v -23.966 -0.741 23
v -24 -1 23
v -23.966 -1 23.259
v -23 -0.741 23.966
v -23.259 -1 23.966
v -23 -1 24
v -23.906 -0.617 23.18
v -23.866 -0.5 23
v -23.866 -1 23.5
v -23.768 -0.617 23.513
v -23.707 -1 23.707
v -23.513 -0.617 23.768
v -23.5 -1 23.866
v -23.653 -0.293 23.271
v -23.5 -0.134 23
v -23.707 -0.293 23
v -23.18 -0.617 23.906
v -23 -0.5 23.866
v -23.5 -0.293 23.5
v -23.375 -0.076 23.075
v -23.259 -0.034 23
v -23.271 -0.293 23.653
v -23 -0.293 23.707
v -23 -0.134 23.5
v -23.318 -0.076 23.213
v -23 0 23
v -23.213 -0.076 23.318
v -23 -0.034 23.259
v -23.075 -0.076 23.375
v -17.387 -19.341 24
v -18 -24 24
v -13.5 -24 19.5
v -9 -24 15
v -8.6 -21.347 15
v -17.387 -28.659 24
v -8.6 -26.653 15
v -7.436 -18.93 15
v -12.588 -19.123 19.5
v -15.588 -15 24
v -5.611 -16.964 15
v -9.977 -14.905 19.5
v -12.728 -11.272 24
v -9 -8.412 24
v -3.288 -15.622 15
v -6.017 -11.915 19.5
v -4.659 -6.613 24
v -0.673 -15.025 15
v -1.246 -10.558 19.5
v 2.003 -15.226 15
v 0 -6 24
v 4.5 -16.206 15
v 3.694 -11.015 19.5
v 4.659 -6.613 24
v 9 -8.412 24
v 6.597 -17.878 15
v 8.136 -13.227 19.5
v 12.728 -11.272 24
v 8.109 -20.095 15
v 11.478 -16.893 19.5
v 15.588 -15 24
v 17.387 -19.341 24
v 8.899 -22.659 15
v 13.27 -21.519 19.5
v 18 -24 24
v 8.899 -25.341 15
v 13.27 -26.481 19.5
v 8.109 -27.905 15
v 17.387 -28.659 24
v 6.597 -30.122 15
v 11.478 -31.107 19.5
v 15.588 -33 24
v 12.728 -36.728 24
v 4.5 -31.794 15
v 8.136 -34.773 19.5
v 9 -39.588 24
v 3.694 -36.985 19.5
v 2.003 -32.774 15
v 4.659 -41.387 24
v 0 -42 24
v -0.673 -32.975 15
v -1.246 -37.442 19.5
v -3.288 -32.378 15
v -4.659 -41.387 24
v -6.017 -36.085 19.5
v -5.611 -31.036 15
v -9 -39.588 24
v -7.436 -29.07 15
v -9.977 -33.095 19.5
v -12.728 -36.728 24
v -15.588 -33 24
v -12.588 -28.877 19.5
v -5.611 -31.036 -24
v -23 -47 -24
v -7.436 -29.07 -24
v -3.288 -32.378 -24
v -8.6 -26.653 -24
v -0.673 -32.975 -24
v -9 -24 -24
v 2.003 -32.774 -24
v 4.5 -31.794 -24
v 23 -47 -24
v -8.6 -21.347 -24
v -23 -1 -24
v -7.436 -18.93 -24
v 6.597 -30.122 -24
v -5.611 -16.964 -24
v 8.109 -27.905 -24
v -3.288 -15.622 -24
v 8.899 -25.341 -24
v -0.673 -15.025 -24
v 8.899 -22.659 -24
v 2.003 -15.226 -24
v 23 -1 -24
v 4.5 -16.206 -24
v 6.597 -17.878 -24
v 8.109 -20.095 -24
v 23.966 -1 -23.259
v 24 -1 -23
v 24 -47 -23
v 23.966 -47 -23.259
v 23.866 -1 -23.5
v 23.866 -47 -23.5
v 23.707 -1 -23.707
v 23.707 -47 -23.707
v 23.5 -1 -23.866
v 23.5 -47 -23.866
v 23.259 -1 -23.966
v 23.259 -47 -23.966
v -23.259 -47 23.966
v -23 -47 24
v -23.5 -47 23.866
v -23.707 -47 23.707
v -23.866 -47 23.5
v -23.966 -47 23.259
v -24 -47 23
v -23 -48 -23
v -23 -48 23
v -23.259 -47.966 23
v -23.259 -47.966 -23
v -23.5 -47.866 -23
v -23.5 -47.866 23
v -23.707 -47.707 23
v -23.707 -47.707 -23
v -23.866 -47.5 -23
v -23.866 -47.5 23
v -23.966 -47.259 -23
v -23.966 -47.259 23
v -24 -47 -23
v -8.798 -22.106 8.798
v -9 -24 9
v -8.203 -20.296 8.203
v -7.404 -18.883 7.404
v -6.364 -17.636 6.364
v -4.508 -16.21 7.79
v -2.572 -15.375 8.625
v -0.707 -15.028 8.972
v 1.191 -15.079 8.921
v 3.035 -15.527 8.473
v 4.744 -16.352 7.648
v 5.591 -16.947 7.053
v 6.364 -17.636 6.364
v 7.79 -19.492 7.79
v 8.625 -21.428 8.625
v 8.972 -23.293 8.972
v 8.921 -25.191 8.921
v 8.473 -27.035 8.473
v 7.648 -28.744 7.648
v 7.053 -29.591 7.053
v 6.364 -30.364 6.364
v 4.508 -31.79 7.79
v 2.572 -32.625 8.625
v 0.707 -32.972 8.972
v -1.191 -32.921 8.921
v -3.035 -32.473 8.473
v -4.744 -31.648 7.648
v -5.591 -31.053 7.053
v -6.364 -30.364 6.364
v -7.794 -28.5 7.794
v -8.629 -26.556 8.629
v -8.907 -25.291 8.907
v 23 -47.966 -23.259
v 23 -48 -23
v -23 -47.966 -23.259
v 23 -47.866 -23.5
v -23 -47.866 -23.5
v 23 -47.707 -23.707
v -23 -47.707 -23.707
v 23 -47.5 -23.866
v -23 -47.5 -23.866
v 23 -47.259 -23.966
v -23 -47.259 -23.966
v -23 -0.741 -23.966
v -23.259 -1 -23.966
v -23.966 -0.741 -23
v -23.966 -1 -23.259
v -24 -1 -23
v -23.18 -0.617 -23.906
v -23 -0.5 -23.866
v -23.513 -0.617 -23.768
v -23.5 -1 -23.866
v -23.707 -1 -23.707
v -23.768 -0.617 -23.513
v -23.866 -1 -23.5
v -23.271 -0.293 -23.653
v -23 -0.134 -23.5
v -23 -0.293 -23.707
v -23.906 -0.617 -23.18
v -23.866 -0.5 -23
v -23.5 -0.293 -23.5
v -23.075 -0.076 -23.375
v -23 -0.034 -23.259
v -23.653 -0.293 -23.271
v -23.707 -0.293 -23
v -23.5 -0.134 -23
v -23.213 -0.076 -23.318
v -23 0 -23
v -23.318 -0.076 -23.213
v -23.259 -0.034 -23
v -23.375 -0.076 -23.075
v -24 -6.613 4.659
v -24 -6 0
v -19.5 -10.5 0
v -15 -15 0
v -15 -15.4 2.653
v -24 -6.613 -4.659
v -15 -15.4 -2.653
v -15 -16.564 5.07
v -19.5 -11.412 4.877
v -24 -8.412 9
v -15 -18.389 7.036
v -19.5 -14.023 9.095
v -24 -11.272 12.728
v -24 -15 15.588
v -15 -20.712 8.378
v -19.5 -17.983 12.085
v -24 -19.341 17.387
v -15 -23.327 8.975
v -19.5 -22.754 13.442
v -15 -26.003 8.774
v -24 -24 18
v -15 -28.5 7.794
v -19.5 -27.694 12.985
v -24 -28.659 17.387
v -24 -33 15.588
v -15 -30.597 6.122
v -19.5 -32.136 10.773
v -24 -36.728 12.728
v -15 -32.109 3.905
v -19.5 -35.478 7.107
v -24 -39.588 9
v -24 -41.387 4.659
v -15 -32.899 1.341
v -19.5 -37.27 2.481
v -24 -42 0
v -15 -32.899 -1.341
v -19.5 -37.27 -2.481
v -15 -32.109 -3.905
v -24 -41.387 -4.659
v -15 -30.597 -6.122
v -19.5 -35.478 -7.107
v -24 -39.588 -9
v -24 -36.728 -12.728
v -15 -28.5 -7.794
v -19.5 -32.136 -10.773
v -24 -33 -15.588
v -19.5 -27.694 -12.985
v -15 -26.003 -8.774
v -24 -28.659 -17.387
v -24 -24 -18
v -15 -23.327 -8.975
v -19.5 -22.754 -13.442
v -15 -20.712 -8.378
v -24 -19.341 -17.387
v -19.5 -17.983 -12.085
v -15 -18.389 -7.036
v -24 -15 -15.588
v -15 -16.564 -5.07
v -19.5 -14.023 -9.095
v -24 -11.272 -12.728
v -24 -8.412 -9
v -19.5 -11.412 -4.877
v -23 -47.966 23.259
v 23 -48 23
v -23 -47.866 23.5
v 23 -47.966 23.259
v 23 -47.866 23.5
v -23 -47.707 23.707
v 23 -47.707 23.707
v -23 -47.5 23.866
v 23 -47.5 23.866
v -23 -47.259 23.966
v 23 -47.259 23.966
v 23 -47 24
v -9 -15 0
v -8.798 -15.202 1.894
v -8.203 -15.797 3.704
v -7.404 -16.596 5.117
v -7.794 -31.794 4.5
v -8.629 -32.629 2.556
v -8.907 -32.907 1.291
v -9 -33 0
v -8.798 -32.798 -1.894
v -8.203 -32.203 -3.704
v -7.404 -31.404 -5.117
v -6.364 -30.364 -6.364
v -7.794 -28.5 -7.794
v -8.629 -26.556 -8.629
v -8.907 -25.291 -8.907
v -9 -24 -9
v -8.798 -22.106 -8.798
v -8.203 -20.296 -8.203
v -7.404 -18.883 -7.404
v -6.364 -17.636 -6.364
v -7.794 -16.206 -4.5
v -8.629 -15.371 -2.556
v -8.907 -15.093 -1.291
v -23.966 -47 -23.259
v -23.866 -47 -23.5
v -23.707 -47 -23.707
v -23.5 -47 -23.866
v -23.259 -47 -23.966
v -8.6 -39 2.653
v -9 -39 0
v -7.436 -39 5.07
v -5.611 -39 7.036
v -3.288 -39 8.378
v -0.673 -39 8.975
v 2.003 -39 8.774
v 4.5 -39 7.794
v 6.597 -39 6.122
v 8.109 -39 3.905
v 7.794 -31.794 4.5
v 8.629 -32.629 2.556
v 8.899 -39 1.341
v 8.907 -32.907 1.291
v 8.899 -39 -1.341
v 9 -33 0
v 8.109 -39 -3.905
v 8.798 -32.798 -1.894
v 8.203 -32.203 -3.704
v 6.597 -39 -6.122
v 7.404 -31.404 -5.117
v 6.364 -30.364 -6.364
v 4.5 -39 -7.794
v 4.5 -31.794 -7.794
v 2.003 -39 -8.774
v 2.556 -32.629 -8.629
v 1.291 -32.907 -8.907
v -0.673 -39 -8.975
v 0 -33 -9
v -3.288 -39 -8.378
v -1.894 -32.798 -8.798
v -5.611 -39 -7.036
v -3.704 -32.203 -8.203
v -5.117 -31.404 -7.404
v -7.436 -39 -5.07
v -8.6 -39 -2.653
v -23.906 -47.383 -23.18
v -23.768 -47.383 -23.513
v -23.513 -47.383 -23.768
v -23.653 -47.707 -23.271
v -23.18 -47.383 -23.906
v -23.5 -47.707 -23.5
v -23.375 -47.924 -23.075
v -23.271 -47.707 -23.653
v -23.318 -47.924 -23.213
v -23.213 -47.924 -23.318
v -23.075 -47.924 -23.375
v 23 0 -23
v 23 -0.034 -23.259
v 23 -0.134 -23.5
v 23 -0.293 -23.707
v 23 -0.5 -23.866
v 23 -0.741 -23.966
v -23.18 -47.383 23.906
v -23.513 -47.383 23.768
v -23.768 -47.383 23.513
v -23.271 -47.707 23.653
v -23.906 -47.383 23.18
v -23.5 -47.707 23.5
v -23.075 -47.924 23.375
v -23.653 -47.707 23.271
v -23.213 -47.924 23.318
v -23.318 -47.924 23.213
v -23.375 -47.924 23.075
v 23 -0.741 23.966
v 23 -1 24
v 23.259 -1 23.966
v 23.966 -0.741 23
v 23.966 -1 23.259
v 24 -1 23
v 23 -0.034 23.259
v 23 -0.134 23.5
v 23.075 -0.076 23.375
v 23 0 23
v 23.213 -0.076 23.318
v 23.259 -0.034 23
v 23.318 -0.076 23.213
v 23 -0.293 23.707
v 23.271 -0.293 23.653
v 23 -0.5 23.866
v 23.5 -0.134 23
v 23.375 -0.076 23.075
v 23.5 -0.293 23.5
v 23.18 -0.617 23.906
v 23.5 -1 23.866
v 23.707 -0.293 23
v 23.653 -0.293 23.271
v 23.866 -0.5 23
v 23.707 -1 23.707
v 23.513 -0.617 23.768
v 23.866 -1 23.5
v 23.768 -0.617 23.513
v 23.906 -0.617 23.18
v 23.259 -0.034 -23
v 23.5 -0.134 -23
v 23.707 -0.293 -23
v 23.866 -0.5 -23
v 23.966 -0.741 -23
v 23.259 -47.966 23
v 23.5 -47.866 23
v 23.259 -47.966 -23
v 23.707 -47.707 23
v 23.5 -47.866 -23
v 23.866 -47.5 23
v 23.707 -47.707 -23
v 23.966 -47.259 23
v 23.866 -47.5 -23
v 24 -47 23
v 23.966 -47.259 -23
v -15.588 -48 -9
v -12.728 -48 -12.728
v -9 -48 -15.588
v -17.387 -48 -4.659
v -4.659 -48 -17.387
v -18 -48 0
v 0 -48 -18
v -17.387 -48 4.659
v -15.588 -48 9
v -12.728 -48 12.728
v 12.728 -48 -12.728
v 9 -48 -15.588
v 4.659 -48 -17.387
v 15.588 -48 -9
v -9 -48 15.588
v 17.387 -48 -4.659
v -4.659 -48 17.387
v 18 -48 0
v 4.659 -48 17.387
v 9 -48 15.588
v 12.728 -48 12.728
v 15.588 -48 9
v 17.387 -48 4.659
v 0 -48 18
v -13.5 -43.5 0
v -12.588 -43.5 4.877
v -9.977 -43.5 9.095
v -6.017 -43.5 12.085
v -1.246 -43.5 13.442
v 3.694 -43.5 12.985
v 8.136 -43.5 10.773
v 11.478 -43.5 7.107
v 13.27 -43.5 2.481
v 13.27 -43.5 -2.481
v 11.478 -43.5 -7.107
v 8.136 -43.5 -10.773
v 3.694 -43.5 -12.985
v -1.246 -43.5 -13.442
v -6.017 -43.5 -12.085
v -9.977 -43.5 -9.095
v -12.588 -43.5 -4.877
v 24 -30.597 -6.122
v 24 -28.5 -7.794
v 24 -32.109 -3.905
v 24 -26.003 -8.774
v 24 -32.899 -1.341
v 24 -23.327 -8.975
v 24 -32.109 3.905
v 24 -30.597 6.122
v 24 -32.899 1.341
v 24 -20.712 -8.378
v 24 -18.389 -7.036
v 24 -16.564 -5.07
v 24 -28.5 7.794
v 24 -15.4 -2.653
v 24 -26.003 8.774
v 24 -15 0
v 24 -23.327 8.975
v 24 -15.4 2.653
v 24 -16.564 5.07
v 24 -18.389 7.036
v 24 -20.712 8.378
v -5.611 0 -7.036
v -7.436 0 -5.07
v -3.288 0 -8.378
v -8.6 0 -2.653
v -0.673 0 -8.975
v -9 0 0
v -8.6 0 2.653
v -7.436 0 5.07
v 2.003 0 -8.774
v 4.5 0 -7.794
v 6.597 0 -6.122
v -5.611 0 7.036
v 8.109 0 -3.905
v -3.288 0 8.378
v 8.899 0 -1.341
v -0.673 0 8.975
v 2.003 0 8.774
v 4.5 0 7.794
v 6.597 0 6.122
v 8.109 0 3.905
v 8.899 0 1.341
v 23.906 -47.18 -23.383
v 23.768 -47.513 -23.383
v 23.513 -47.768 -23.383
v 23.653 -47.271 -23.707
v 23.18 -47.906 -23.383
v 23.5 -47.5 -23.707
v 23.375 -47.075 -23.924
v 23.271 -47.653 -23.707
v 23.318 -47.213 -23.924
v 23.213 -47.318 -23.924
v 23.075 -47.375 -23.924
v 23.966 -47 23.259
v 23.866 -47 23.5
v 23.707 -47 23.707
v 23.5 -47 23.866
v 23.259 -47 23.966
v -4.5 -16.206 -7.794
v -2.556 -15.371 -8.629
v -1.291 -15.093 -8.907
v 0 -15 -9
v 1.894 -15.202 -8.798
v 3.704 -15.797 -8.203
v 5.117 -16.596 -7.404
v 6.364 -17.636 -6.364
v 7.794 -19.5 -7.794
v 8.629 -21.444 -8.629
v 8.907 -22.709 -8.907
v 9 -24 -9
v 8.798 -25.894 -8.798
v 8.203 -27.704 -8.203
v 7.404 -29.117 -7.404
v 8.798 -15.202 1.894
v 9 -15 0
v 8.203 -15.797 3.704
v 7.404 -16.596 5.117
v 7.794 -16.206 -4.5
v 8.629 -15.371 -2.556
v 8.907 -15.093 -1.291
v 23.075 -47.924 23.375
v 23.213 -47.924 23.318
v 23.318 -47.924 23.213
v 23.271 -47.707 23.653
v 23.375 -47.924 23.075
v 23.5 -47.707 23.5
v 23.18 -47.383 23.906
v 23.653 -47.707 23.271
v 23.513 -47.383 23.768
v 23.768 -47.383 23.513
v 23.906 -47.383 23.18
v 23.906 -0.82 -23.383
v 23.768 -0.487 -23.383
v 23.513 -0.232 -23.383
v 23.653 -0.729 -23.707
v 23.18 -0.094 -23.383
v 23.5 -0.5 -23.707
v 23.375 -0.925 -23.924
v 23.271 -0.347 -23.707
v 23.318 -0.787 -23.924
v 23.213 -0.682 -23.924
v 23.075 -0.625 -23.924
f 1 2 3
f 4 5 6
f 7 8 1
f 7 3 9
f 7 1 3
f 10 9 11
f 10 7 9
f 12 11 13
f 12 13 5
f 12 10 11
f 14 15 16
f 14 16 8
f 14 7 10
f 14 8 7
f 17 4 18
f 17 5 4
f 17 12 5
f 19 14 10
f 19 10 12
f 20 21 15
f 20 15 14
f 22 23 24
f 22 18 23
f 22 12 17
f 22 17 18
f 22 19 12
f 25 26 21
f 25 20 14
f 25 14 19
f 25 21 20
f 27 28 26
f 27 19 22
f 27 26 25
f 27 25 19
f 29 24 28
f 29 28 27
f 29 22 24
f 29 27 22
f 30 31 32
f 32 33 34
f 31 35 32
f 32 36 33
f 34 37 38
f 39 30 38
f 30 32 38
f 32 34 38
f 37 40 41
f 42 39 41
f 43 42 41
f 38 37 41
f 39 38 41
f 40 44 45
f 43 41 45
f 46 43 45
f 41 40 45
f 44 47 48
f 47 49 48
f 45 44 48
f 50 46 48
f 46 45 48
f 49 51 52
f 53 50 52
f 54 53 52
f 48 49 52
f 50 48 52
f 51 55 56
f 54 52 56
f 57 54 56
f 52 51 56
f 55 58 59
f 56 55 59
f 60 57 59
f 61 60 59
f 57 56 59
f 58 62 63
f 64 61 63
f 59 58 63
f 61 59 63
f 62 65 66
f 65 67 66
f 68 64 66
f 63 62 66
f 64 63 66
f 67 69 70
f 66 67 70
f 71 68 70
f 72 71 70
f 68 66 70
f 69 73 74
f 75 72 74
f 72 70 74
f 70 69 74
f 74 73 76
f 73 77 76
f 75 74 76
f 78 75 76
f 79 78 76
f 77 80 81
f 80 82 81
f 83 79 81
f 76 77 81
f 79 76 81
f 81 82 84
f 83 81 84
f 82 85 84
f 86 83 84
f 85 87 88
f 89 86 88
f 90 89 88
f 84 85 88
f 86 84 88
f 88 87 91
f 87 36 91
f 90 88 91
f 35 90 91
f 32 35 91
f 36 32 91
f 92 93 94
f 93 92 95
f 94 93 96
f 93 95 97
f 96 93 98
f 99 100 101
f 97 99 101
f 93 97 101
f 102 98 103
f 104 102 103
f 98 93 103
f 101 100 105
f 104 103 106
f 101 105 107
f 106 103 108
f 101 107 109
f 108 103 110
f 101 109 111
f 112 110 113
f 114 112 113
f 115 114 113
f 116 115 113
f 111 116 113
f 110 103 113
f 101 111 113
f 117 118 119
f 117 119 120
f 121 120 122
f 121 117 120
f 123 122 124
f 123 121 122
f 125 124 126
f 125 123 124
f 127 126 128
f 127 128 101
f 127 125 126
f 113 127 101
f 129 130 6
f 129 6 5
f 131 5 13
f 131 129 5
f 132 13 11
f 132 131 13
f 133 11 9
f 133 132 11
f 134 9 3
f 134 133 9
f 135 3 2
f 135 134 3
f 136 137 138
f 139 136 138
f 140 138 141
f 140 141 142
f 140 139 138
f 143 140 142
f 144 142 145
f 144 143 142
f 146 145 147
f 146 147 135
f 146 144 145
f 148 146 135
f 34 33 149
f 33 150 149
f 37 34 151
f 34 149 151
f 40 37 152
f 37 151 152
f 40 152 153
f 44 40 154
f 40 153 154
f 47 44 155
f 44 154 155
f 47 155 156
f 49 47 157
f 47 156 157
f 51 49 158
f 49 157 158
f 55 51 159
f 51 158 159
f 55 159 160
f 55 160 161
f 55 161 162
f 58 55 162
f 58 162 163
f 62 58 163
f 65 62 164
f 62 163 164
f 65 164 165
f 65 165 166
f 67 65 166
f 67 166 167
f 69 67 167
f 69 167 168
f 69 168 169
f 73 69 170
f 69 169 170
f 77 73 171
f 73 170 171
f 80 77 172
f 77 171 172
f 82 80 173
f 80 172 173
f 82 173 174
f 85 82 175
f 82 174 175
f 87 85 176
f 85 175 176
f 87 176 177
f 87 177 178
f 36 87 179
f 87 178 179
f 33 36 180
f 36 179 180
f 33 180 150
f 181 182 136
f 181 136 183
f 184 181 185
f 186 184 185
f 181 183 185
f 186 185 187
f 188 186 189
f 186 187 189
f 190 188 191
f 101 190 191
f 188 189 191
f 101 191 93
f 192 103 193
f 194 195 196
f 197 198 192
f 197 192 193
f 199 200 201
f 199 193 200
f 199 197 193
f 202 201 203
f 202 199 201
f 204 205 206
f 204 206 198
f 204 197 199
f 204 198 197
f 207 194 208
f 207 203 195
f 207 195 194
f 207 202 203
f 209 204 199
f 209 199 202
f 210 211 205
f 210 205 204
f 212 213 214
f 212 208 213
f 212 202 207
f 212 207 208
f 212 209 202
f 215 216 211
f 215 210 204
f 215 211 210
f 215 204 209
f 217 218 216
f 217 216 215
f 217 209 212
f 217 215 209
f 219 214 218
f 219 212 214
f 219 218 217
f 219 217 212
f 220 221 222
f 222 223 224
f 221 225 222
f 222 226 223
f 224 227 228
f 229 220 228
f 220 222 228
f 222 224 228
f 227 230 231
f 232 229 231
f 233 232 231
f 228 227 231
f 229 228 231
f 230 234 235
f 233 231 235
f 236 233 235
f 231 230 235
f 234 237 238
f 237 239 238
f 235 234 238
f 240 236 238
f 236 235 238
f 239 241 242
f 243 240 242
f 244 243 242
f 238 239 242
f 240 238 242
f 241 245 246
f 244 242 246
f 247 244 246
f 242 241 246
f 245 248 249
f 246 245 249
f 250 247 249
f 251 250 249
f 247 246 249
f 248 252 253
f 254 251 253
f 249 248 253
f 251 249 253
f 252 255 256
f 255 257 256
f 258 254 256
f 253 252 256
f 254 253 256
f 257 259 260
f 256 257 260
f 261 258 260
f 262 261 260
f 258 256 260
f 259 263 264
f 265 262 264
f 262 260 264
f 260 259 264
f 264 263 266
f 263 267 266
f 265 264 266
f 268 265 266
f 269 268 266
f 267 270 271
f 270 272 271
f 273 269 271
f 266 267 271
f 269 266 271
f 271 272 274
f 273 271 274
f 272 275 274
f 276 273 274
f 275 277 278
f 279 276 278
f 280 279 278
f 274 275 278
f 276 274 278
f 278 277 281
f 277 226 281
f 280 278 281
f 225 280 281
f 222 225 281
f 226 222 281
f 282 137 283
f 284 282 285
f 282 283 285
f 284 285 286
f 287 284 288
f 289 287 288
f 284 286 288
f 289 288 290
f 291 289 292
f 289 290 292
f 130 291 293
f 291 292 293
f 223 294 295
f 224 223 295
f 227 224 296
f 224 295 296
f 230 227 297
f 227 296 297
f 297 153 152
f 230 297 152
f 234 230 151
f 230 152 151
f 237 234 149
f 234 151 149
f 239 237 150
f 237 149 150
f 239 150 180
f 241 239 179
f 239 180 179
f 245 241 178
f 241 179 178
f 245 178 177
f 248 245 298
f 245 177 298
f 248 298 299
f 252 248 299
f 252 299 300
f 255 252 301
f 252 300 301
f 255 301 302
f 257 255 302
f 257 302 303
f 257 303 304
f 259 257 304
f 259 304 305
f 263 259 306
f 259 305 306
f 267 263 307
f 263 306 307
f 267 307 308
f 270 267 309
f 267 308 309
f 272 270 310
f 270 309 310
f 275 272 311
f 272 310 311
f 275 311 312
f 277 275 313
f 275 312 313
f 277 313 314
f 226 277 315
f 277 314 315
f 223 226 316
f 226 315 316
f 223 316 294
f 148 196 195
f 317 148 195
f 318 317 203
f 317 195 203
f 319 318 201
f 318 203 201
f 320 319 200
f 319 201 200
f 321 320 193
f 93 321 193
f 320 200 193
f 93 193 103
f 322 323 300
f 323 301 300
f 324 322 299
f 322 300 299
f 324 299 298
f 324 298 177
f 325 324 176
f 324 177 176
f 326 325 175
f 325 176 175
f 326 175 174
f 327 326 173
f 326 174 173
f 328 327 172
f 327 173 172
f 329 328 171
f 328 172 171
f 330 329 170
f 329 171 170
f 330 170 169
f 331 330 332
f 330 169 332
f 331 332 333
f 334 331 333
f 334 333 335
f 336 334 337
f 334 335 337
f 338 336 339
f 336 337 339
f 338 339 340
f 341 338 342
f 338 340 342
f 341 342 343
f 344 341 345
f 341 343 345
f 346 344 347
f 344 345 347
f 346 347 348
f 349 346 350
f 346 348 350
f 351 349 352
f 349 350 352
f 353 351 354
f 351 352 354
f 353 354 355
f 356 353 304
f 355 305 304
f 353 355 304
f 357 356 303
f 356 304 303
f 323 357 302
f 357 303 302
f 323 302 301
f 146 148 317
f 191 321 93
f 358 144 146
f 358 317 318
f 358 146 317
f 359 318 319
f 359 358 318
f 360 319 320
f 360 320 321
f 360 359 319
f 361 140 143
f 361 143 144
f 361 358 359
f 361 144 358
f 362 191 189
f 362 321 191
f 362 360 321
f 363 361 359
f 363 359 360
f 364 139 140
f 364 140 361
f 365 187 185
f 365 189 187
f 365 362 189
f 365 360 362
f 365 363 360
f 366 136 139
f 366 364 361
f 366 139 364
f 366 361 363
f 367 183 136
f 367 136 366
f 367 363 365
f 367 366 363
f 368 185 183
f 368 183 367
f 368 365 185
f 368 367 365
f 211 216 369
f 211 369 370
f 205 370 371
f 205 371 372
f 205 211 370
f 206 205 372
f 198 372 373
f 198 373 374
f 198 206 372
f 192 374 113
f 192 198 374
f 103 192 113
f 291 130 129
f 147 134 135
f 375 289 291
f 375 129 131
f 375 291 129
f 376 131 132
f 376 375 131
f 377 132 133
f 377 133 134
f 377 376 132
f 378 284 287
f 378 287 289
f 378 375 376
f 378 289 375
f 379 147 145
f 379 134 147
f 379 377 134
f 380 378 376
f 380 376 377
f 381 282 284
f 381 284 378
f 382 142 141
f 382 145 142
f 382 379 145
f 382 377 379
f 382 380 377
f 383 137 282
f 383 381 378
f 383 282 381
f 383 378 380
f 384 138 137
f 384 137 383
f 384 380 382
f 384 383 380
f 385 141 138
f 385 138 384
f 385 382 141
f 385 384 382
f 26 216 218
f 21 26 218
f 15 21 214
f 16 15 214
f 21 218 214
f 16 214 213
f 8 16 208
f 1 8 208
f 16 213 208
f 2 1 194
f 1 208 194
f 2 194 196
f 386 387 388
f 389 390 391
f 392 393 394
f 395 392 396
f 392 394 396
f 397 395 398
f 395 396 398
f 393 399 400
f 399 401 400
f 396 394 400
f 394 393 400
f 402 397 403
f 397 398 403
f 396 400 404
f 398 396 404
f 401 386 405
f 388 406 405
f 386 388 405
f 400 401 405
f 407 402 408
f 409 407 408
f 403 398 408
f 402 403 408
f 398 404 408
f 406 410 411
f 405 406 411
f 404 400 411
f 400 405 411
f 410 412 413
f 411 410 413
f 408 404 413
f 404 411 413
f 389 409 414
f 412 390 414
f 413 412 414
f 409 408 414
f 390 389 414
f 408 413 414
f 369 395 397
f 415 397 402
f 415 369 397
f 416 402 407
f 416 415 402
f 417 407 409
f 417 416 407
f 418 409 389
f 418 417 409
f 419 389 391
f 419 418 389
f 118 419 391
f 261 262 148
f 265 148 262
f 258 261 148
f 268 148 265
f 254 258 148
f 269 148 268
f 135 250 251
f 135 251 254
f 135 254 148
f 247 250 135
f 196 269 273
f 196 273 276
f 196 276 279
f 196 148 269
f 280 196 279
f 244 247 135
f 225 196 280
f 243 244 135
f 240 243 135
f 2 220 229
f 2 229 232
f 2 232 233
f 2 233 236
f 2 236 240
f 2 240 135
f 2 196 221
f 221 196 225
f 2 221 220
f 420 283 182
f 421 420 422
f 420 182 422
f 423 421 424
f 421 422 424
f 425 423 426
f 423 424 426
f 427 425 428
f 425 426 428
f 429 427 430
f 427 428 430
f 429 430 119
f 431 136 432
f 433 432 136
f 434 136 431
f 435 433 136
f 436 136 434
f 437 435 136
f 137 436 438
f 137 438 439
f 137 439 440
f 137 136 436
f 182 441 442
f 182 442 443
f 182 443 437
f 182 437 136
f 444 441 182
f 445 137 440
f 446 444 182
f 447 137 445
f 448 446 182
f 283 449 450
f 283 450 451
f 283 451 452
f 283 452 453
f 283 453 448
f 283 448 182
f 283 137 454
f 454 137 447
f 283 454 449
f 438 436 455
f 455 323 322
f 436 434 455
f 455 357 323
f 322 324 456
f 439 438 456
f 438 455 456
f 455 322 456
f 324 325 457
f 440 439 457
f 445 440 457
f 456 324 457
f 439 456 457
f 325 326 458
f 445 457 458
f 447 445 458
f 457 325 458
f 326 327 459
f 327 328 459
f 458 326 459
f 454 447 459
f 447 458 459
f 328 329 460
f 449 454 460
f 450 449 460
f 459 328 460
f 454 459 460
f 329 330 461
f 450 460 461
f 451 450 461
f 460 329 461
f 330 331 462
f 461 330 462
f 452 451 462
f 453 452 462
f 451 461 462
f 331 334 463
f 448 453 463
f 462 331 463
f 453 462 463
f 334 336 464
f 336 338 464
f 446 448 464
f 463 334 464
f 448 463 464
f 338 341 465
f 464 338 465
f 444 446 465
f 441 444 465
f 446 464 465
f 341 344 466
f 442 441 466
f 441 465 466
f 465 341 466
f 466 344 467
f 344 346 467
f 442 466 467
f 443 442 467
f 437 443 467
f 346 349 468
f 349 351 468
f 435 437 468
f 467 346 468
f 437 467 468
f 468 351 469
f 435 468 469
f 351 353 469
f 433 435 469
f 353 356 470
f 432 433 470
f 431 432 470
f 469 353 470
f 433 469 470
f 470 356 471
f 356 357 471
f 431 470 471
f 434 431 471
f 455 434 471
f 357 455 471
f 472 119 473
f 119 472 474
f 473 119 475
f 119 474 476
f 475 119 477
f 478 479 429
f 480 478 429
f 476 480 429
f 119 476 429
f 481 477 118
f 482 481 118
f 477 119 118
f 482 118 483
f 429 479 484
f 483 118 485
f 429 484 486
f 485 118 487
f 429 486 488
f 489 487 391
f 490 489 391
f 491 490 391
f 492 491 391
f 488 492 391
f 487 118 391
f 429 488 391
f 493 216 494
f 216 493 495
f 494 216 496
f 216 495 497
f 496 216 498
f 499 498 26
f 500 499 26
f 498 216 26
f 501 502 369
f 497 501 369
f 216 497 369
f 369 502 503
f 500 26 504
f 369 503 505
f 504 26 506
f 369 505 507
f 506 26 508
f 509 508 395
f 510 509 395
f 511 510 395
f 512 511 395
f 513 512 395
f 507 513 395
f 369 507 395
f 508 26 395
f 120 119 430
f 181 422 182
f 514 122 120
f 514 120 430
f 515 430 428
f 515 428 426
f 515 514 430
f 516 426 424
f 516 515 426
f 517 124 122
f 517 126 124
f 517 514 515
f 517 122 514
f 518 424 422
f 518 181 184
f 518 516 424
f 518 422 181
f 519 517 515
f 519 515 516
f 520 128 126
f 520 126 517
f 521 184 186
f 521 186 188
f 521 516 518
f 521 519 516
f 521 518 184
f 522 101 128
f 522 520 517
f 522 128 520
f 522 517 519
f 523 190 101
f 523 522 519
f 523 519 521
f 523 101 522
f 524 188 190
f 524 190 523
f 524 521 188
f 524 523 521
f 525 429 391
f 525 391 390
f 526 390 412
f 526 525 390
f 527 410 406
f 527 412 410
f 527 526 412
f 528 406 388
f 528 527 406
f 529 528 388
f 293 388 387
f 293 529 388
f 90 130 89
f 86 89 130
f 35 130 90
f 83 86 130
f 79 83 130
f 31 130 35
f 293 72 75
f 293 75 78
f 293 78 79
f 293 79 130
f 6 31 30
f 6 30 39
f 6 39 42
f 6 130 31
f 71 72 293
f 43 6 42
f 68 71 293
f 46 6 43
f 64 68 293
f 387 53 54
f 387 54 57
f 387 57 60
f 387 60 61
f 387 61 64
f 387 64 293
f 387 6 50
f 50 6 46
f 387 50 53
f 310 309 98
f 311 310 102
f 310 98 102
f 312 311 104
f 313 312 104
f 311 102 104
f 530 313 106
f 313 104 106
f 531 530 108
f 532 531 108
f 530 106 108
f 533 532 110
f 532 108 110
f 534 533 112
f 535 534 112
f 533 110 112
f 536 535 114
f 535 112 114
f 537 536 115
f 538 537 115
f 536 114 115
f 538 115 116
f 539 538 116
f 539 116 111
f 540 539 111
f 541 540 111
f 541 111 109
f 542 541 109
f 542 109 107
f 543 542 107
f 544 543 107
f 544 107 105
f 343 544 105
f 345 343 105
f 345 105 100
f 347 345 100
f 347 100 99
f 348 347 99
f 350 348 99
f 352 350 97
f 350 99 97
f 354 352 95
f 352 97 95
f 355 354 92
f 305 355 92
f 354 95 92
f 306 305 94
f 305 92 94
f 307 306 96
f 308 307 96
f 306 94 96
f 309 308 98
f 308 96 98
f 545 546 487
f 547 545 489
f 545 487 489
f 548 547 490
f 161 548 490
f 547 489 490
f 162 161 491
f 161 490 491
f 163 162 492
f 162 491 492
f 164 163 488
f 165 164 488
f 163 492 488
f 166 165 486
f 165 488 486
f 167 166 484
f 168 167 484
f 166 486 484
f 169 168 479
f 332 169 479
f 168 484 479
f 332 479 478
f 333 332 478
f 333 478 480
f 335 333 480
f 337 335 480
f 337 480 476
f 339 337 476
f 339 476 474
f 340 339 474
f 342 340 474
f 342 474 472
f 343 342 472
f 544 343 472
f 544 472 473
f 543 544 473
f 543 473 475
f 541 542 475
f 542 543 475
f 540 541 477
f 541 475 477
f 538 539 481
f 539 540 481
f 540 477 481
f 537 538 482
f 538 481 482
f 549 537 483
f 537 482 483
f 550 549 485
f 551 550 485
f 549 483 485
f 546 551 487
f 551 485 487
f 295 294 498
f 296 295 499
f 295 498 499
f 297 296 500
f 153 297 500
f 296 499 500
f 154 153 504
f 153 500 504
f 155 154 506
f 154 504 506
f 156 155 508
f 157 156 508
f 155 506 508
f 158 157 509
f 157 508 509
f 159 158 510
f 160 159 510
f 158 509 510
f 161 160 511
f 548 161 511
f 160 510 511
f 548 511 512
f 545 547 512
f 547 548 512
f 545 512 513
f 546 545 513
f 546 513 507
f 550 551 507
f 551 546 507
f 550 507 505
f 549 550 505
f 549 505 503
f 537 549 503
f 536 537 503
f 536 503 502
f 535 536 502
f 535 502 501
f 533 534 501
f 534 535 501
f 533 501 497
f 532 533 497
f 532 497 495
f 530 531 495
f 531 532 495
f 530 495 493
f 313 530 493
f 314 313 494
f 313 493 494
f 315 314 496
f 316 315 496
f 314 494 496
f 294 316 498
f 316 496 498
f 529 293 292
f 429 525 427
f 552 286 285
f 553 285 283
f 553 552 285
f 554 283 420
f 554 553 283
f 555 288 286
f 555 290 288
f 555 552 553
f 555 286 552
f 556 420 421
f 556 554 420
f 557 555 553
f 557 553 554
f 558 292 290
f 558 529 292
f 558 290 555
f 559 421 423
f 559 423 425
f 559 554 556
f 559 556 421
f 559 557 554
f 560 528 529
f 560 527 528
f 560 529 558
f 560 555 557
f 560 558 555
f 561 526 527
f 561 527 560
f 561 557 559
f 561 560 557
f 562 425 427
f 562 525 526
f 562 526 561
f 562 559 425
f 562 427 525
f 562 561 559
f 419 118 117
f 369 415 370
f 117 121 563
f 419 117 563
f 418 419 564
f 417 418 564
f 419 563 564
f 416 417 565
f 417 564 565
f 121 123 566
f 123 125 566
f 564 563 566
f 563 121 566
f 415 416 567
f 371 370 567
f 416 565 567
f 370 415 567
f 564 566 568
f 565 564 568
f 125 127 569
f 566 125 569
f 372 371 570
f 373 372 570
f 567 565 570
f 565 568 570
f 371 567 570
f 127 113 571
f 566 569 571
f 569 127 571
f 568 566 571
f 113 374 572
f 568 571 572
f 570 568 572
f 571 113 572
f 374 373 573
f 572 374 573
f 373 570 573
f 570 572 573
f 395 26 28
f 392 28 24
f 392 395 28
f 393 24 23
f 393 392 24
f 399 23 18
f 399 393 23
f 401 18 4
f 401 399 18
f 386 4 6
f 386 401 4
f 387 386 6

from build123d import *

# Parameters (mm, degrees)
F0_W            = 48
F0_H            = 48
F1_DEPTH        = 48
F2_R            = 1
F3_R            = 1
F4_T1_DEPTH     = 46
F4_T3_DEPTH     = 46
F4_T5_DEPTH     = 46
F4_S9_W         = 1
F4_S9_H         = 1
F4_T10_DEPTH    = 1
F4_S15_W        = 1
F4_S15_H        = 1
F4_T16_DEPTH    = 1
F4_S21_W        = 1
F4_S21_H        = 1
F4_T22_DEPTH    = 1
F4_S27_W        = 1
F4_S27_H        = 1
F4_T28_DEPTH    = 1
F4_T32_ANGLE    = 90
F4_T34_ANGLE    = 90
F6_D            = 18
F6_CSINK_D      = 36
F6_CSINK_ANGLE  = 90
F8_D            = 18
F8_CSINK_D      = 36
F8_CSINK_ANGLE  = 90
F10_D           = 18
F10_CSINK_D     = 36
F10_CSINK_ANGLE = 90


# Not quite as in the source:
# - a fillet or chamfer that OpenCascade refuses, or shapes differently, is made with other operations: its cross-section is extruded or revolved along the edge and cut away or added


with BuildPart() as f1:
    # F0 (on Front) → F1 (new body)
    with BuildSketch(Plane.XZ):
        Rectangle(F0_W, F0_H)
    extrude(amount=F1_DEPTH)

    # F2
    f2_edges = [f1.edges().sort_by_distance(p)[0] for p in [
        (24, -24, 24),
    ]]
    fillet(f2_edges, radius=F2_R)

    # F3
    f3_edges = [f1.edges().sort_by_distance(p)[0] for p in [
        (-24, -24, 24),
        (-0.5, 0, 24),
        (-0.5, -48, 24),
    ]]
    fillet(f3_edges, radius=F3_R)

    # F4: fillet of radius 1 on 8 edges, made by hand

    # F4_s2 → F4_t1 (cut)
    with BuildSketch(Plane.XY.offset(-23)):
        with BuildLine():
            ThreePointArc((-23, -48), (-23.7071067812, -47.7071067812), (-24, -47))
            Line((-24, -47), (-24, -48))
            Line((-24, -48), (-23, -48))
        make_face()
        with BuildLine():
            ThreePointArc((-23, 0), (-23.7071067812, -0.2928932188), (-24, -1))
            Line((-24, -1), (-24, 0))
            Line((-24, 0), (-23, 0))
        make_face()
    extrude(amount=F4_T1_DEPTH, mode=Mode.SUBTRACT)

    # F4_s4 → F4_t3 (cut)
    with BuildSketch(Plane.YZ.offset(-23)):
        with BuildLine():
            ThreePointArc((0, -23), (-0.2928932188, -23.7071067812), (-1, -24))
            Line((-1, -24), (0, -24))
            Line((0, -24), (0, -23))
        make_face()
        with BuildLine():
            ThreePointArc((-48, -23), (-47.7071067812, -23.7071067812), (-47, -24))
            Line((-47, -24), (-48, -24))
            Line((-48, -24), (-48, -23))
        make_face()
    extrude(amount=F4_T3_DEPTH, mode=Mode.SUBTRACT)

    # F4_s6 → F4_t5 (cut)
    with BuildSketch(Plane.XZ.offset(1)):
        with BuildLine():
            ThreePointArc((-24, -23), (-23.7071067812, -23.7071067812), (-23, -24))
            Line((-23, -24), (-24, -24))
            Line((-24, -24), (-24, -23))
        make_face()
        with BuildLine():
            ThreePointArc((24, -23), (23.7071067812, -23.7071067812), (23, -24))
            Line((23, -24), (24, -24))
            Line((24, -24), (24, -23))
        make_face()
    extrude(amount=F4_T5_DEPTH, mode=Mode.SUBTRACT)


with BuildPart() as f4_tool8:
    # F4_s9 → F4_t10 (new body)
    with BuildSketch(Plane.XZ.offset(1)):
        with Locations((-23.5, 23.5)):
            Rectangle(F4_S9_W, F4_S9_H)
    extrude(amount=-F4_T10_DEPTH)

    # F4_s11 → F4_t12 (revolve, cut)
    with BuildSketch(Plane(origin=(-23, -1, 23), x_dir=(0.7071067812, 0, -0.7071067812), z_dir=(0.7071067812, 0, 0.7071067812))):
        with BuildLine():
            ThreePointArc((0, -1), (1, 0), (0, 1))
            Line((0, 1), (0, -1))
        make_face()
    revolve(axis=Axis((-23, -1, 23), (0, 1, 0)), mode=Mode.SUBTRACT)


with BuildPart() as f1_1:
    add(f1.part)

    # F4_t7: cut F4_tool8
    add(f4_tool8.part, mode=Mode.SUBTRACT)


with BuildPart() as f4_tool14:
    # F4_s15 → F4_t16 (new body)
    with BuildSketch(Plane.XZ.offset(47)):
        with Locations((-23.5, 23.5)):
            Rectangle(F4_S15_W, F4_S15_H)
    extrude(amount=F4_T16_DEPTH)

    # F4_s17 → F4_t18 (revolve, cut)
    with BuildSketch(Plane(origin=(-23, -47, 23), x_dir=(0.7071067812, 0, -0.7071067812), z_dir=(-0.7071067812, 0, -0.7071067812))):
        with BuildLine():
            ThreePointArc((0, -1), (1, 0), (0, 1))
            Line((0, 1), (0, -1))
        make_face()
    revolve(axis=Axis((-23, -47, 23), (0, -1, 0)), mode=Mode.SUBTRACT)


with BuildPart() as f1_2:
    add(f1_1.part)

    # F4_t13: cut F4_tool14
    add(f4_tool14.part, mode=Mode.SUBTRACT)


with BuildPart() as f4_tool20:
    # F4_s21 → F4_t22 (new body)
    with BuildSketch(Plane.XZ.offset(47)):
        with Locations((-23.5, -23.5)):
            Rectangle(F4_S21_W, F4_S21_H)
    extrude(amount=F4_T22_DEPTH)

    # F4_s23 → F4_t24 (revolve, cut)
    with BuildSketch(Plane(origin=(-23, -47, -23), x_dir=(0.7071067812, 0, 0.7071067812), z_dir=(0.7071067812, 0, -0.7071067812))):
        with BuildLine():
            ThreePointArc((0, -1), (1, 0), (0, 1))
            Line((0, 1), (0, -1))
        make_face()
    revolve(axis=Axis((-23, -47, -23), (0, -1, 0)), mode=Mode.SUBTRACT)


with BuildPart() as f1_3:
    add(f1_2.part)

    # F4_t19: cut F4_tool20
    add(f4_tool20.part, mode=Mode.SUBTRACT)


with BuildPart() as f4_tool26:
    # F4_s27 → F4_t28 (new body)
    with BuildSketch(Plane.XZ.offset(1)):
        with Locations((-23.5, -23.5)):
            Rectangle(F4_S27_W, F4_S27_H)
    extrude(amount=-F4_T28_DEPTH)

    # F4_s29 → F4_t30 (revolve, cut)
    with BuildSketch(Plane(origin=(-23, -1, -23), x_dir=(0.7071067812, 0, 0.7071067812), z_dir=(-0.7071067812, 0, 0.7071067812))):
        with BuildLine():
            ThreePointArc((0, -1), (1, 0), (0, 1))
            Line((0, 1), (0, -1))
        make_face()
    revolve(axis=Axis((-23, -1, -23), (0, 1, 0)), mode=Mode.SUBTRACT)


with BuildPart() as f1_4:
    add(f1_3.part)

    # F4_t25: cut F4_tool26
    add(f4_tool26.part, mode=Mode.SUBTRACT)

    # F4_s31 → F4_t32 (revolve, cut)
    with BuildSketch(Plane.XZ.offset(1)):
        with BuildLine():
            ThreePointArc((24, -23), (23.7071067812, -23.7071067812), (23, -24))
            Line((23, -24), (24, -24))
            Line((24, -24), (24, -23))
        make_face()
    revolve(axis=Axis((23, -1, -24), (0, 0, 1)), revolution_arc=F4_T32_ANGLE, mode=Mode.SUBTRACT)

    # F4_s33 → F4_t34 (revolve, cut)
    with BuildSketch(Plane.XZ.offset(47)):
        with BuildLine():
            ThreePointArc((24, -23), (23.7071067812, -23.7071067812), (23, -24))
            Line((23, -24), (24, -24))
            Line((24, -24), (24, -23))
        make_face()
    revolve(axis=Axis((23, -47, -24), (0, 0, -1)), revolution_arc=F4_T34_ANGLE, mode=Mode.SUBTRACT)

    # F6 (through all)
    with Locations(Plane.XY.offset(24)):
        with Locations((0, -24)):
            CounterSinkHole(F6_D / 2, F6_CSINK_D / 2, counter_sink_angle=F6_CSINK_ANGLE)

    # F8 (through all)
    with Locations(Plane(origin=(-24, 0, 0), x_dir=(0, -1, 0), z_dir=(-1, 0, 0))):
        with Locations((24, 0)):
            CounterSinkHole(F8_D / 2, F8_CSINK_D / 2, counter_sink_angle=F8_CSINK_ANGLE)

    # F10 (through all)
    with Locations(Plane.XZ.offset(48)):
        with Locations((0, 0)):
            CounterSinkHole(F10_D / 2, F10_CSINK_D / 2, counter_sink_angle=F10_CSINK_ANGLE)


solid = f1_4.part
